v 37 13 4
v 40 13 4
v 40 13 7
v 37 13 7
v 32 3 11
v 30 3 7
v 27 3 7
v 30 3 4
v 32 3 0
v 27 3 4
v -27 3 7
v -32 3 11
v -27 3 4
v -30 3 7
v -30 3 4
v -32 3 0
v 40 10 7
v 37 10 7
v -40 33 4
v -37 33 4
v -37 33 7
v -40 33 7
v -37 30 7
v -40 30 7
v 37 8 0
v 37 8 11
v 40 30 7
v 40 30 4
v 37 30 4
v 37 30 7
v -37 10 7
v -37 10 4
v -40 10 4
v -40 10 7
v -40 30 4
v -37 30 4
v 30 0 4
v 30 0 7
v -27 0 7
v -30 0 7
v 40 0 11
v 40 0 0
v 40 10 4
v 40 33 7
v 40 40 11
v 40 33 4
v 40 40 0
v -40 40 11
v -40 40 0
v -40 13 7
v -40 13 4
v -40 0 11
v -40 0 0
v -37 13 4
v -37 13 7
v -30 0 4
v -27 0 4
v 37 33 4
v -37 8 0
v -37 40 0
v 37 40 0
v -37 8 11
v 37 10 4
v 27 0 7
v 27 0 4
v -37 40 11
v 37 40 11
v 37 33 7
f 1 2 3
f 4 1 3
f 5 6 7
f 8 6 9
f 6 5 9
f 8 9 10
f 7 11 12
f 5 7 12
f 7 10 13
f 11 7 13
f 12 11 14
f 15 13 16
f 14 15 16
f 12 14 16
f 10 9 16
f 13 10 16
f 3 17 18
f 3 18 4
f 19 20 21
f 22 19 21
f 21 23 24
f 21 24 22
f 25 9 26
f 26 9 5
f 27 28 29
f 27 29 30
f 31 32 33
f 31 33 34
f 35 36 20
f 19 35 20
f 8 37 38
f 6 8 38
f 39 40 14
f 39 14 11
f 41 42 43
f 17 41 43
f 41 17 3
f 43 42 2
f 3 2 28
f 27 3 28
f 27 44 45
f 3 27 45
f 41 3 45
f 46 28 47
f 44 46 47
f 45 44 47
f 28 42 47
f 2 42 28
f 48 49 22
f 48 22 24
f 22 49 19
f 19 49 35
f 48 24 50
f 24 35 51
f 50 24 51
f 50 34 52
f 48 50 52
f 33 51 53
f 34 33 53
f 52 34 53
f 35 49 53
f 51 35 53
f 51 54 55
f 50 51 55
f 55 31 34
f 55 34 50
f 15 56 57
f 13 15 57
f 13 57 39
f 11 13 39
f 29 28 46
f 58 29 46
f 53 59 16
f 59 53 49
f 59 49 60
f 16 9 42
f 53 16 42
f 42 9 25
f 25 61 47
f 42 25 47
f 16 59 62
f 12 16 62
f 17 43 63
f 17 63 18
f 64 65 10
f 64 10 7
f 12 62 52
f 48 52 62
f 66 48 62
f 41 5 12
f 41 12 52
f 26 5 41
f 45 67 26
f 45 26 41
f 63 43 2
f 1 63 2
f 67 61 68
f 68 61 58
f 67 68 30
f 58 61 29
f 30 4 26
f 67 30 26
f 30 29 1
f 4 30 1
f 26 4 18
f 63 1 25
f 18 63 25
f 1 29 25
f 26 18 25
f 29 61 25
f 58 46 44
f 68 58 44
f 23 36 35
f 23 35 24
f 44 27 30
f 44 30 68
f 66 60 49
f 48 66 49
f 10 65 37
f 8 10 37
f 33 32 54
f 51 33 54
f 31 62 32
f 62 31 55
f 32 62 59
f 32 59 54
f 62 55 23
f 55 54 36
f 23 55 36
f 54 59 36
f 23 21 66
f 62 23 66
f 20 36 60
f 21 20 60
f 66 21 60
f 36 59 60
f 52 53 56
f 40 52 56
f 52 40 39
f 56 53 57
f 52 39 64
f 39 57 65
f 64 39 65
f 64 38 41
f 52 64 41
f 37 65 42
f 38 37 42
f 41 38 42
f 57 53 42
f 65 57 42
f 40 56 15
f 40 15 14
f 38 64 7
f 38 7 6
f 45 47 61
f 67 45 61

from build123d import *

# Parameters (mm, degrees)
F1_DEPTH = 11
F2_SIZE  = 5
F4_ANGLE = -90
F5_W     = 3
F5_H     = 3
F6_DEPTH = 80.001
F7_W     = 3
F7_H     = 3
F8_DEPTH = 25


with BuildPart() as f1:
    # F0 (on Front) → F1 (new body)
    with BuildSketch(Plane.XZ):
        Polygon((-40, 40), (-40, 0), (40, 0), (40, 40), (37, 40), (37, 3), (-37, 3), (-37, 40), align=None)
    extrude(amount=F1_DEPTH)

    # F2
    f2_edges = [f1.edges().sort_by_distance(p)[0] for p in [
        (-37, -5.5, 3),
        (37, -5.5, 3),
    ]]
    chamfer(f2_edges, length=F2_SIZE)


with BuildPart() as f1_1:
    # F4: moved
    add(f1.part.rotate(Axis((33.50826, 0, 0), (1, 0, 0)), F4_ANGLE))

    # F5 (on face) → F6 (cut, through all)
    with BuildSketch(Plane.YZ.offset(40)):
        with Locations((11.5, 5.5)):
            Rectangle(F5_W, F5_H)
        with Locations((31.5, 5.5)):
            Rectangle(F5_W, F5_H)
    extrude(amount=-F6_DEPTH, mode=Mode.SUBTRACT)

    # F7 (on face) → F8 (cut)
    with BuildSketch(Plane.XZ):
        with Locations((-28.5, 5.5)):
            Rectangle(F7_W, F7_H)
        with Locations((28.5, 5.5)):
            Rectangle(F7_W, F7_H)
    extrude(amount=-F8_DEPTH, mode=Mode.SUBTRACT)


solid = f1_1.part
